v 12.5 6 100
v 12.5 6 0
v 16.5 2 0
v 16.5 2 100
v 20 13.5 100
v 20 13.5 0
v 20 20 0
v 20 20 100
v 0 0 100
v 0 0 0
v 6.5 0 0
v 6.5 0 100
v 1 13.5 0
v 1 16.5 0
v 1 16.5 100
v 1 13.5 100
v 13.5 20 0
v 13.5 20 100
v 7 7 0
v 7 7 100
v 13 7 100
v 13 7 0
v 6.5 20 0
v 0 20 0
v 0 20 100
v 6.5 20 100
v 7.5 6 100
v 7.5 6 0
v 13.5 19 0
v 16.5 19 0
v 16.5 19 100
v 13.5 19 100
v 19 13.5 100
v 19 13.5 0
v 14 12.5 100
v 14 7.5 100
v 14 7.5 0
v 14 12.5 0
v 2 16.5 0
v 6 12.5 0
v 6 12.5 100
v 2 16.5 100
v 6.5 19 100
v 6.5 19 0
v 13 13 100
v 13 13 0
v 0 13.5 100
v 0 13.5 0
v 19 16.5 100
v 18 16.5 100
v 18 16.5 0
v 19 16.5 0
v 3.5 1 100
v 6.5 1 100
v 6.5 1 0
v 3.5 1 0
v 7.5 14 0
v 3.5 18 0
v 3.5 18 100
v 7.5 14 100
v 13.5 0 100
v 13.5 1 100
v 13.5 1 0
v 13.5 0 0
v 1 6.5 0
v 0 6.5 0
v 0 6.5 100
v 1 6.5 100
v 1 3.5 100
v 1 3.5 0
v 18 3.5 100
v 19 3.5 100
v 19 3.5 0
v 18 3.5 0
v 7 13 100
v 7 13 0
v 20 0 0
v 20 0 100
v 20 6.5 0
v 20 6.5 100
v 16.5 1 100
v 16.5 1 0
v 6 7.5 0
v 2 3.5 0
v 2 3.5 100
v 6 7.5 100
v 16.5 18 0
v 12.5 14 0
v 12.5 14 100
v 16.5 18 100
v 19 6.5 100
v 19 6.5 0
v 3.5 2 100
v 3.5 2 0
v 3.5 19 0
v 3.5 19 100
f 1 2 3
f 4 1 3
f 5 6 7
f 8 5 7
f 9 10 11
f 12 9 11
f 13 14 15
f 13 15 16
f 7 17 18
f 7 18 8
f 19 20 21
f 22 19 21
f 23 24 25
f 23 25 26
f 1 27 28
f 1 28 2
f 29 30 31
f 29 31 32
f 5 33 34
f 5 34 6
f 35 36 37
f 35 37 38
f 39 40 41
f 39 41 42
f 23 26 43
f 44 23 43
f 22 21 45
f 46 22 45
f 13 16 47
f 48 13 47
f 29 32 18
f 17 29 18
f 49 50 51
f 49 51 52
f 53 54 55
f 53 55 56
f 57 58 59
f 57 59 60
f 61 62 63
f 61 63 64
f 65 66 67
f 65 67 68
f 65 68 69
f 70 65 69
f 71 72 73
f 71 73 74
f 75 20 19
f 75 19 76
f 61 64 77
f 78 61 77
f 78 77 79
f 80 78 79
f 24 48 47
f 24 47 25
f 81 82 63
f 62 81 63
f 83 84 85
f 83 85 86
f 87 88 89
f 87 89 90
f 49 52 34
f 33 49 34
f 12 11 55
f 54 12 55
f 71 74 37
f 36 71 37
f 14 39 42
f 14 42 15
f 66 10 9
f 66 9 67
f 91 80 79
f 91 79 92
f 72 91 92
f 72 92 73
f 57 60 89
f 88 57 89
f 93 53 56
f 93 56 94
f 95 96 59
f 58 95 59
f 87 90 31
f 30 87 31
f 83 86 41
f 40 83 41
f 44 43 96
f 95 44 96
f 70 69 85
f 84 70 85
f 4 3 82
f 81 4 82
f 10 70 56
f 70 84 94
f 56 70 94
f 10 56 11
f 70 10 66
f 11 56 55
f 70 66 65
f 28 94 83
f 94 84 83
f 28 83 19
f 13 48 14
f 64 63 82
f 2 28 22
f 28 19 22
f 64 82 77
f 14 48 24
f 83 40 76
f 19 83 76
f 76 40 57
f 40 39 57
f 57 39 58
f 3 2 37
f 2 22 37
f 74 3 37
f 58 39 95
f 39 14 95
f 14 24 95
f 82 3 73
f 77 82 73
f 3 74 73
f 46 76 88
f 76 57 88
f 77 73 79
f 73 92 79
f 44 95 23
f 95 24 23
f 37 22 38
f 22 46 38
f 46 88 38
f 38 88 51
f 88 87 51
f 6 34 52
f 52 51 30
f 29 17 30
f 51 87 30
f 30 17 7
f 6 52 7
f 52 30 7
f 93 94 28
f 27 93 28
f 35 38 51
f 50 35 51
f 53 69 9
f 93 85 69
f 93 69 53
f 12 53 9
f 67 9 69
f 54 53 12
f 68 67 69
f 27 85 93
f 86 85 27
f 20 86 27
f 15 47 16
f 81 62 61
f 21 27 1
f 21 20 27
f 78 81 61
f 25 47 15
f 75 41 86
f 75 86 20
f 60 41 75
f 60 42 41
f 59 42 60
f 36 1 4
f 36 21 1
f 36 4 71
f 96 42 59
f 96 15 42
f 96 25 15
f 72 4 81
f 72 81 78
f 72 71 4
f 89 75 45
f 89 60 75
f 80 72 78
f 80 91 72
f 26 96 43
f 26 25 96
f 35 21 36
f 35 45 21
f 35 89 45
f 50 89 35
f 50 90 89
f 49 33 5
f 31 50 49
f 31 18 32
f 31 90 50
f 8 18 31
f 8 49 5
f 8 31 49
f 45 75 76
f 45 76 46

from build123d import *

# Parameters (mm, degrees)
SKETCH_W        = 20
SKETCH_H        = 20
PAD_DEPTH       = 100
SKETCH001_W     = 6
SKETCH001_H     = 6
POCKET_DEPTH    = 100.001
POCKET001_DEPTH = 100.001


with BuildPart() as part:
    # Sketch → Pad (new body)
    with BuildSketch(Plane.XY):
        with Locations((10, 10)):
            Rectangle(SKETCH_W, SKETCH_H)
    extrude(amount=PAD_DEPTH)

    # Sketch001 (on Face6 of Pad) → Pocket (cut, through all)
    with BuildSketch(Plane.XY.offset(100)):
        with Locations((10, 10)):
            Rectangle(SKETCH001_W, SKETCH001_H)
    extrude(amount=-POCKET_DEPTH, mode=Mode.SUBTRACT)

    # Sketch002 (on Face5 of Pocket) → Pocket001 (cut, through all)
    with BuildSketch(Plane.XY.offset(100)):
        Polygon((0, 6.5), (1, 6.5), (1, 3.5), (2, 3.5), (6, 7.5), (6, 12.5), (2, 16.5), (1, 16.5), (1, 13.5), (0, 13.5), align=None)
        Polygon((6.5, 0), (6.5, 1), (3.5, 1), (3.5, 2), (7.5, 6), (12.5, 6), (16.5, 2), (16.5, 1), (13.5, 1), (13.5, 0), align=None)
        Polygon((20, 6.5), (19, 6.5), (19, 3.5), (18, 3.5), (14, 7.5), (14, 12.5), (18, 16.5), (19, 16.5), (19, 13.5), (20, 13.5), align=None)
        Polygon((6.5, 20), (6.5, 19), (3.5, 19), (3.5, 18), (7.5, 14), (12.5, 14), (16.5, 18), (16.5, 19), (13.5, 19), (13.5, 20), align=None)
    extrude(amount=-POCKET001_DEPTH, mode=Mode.SUBTRACT)


solid = part.part
